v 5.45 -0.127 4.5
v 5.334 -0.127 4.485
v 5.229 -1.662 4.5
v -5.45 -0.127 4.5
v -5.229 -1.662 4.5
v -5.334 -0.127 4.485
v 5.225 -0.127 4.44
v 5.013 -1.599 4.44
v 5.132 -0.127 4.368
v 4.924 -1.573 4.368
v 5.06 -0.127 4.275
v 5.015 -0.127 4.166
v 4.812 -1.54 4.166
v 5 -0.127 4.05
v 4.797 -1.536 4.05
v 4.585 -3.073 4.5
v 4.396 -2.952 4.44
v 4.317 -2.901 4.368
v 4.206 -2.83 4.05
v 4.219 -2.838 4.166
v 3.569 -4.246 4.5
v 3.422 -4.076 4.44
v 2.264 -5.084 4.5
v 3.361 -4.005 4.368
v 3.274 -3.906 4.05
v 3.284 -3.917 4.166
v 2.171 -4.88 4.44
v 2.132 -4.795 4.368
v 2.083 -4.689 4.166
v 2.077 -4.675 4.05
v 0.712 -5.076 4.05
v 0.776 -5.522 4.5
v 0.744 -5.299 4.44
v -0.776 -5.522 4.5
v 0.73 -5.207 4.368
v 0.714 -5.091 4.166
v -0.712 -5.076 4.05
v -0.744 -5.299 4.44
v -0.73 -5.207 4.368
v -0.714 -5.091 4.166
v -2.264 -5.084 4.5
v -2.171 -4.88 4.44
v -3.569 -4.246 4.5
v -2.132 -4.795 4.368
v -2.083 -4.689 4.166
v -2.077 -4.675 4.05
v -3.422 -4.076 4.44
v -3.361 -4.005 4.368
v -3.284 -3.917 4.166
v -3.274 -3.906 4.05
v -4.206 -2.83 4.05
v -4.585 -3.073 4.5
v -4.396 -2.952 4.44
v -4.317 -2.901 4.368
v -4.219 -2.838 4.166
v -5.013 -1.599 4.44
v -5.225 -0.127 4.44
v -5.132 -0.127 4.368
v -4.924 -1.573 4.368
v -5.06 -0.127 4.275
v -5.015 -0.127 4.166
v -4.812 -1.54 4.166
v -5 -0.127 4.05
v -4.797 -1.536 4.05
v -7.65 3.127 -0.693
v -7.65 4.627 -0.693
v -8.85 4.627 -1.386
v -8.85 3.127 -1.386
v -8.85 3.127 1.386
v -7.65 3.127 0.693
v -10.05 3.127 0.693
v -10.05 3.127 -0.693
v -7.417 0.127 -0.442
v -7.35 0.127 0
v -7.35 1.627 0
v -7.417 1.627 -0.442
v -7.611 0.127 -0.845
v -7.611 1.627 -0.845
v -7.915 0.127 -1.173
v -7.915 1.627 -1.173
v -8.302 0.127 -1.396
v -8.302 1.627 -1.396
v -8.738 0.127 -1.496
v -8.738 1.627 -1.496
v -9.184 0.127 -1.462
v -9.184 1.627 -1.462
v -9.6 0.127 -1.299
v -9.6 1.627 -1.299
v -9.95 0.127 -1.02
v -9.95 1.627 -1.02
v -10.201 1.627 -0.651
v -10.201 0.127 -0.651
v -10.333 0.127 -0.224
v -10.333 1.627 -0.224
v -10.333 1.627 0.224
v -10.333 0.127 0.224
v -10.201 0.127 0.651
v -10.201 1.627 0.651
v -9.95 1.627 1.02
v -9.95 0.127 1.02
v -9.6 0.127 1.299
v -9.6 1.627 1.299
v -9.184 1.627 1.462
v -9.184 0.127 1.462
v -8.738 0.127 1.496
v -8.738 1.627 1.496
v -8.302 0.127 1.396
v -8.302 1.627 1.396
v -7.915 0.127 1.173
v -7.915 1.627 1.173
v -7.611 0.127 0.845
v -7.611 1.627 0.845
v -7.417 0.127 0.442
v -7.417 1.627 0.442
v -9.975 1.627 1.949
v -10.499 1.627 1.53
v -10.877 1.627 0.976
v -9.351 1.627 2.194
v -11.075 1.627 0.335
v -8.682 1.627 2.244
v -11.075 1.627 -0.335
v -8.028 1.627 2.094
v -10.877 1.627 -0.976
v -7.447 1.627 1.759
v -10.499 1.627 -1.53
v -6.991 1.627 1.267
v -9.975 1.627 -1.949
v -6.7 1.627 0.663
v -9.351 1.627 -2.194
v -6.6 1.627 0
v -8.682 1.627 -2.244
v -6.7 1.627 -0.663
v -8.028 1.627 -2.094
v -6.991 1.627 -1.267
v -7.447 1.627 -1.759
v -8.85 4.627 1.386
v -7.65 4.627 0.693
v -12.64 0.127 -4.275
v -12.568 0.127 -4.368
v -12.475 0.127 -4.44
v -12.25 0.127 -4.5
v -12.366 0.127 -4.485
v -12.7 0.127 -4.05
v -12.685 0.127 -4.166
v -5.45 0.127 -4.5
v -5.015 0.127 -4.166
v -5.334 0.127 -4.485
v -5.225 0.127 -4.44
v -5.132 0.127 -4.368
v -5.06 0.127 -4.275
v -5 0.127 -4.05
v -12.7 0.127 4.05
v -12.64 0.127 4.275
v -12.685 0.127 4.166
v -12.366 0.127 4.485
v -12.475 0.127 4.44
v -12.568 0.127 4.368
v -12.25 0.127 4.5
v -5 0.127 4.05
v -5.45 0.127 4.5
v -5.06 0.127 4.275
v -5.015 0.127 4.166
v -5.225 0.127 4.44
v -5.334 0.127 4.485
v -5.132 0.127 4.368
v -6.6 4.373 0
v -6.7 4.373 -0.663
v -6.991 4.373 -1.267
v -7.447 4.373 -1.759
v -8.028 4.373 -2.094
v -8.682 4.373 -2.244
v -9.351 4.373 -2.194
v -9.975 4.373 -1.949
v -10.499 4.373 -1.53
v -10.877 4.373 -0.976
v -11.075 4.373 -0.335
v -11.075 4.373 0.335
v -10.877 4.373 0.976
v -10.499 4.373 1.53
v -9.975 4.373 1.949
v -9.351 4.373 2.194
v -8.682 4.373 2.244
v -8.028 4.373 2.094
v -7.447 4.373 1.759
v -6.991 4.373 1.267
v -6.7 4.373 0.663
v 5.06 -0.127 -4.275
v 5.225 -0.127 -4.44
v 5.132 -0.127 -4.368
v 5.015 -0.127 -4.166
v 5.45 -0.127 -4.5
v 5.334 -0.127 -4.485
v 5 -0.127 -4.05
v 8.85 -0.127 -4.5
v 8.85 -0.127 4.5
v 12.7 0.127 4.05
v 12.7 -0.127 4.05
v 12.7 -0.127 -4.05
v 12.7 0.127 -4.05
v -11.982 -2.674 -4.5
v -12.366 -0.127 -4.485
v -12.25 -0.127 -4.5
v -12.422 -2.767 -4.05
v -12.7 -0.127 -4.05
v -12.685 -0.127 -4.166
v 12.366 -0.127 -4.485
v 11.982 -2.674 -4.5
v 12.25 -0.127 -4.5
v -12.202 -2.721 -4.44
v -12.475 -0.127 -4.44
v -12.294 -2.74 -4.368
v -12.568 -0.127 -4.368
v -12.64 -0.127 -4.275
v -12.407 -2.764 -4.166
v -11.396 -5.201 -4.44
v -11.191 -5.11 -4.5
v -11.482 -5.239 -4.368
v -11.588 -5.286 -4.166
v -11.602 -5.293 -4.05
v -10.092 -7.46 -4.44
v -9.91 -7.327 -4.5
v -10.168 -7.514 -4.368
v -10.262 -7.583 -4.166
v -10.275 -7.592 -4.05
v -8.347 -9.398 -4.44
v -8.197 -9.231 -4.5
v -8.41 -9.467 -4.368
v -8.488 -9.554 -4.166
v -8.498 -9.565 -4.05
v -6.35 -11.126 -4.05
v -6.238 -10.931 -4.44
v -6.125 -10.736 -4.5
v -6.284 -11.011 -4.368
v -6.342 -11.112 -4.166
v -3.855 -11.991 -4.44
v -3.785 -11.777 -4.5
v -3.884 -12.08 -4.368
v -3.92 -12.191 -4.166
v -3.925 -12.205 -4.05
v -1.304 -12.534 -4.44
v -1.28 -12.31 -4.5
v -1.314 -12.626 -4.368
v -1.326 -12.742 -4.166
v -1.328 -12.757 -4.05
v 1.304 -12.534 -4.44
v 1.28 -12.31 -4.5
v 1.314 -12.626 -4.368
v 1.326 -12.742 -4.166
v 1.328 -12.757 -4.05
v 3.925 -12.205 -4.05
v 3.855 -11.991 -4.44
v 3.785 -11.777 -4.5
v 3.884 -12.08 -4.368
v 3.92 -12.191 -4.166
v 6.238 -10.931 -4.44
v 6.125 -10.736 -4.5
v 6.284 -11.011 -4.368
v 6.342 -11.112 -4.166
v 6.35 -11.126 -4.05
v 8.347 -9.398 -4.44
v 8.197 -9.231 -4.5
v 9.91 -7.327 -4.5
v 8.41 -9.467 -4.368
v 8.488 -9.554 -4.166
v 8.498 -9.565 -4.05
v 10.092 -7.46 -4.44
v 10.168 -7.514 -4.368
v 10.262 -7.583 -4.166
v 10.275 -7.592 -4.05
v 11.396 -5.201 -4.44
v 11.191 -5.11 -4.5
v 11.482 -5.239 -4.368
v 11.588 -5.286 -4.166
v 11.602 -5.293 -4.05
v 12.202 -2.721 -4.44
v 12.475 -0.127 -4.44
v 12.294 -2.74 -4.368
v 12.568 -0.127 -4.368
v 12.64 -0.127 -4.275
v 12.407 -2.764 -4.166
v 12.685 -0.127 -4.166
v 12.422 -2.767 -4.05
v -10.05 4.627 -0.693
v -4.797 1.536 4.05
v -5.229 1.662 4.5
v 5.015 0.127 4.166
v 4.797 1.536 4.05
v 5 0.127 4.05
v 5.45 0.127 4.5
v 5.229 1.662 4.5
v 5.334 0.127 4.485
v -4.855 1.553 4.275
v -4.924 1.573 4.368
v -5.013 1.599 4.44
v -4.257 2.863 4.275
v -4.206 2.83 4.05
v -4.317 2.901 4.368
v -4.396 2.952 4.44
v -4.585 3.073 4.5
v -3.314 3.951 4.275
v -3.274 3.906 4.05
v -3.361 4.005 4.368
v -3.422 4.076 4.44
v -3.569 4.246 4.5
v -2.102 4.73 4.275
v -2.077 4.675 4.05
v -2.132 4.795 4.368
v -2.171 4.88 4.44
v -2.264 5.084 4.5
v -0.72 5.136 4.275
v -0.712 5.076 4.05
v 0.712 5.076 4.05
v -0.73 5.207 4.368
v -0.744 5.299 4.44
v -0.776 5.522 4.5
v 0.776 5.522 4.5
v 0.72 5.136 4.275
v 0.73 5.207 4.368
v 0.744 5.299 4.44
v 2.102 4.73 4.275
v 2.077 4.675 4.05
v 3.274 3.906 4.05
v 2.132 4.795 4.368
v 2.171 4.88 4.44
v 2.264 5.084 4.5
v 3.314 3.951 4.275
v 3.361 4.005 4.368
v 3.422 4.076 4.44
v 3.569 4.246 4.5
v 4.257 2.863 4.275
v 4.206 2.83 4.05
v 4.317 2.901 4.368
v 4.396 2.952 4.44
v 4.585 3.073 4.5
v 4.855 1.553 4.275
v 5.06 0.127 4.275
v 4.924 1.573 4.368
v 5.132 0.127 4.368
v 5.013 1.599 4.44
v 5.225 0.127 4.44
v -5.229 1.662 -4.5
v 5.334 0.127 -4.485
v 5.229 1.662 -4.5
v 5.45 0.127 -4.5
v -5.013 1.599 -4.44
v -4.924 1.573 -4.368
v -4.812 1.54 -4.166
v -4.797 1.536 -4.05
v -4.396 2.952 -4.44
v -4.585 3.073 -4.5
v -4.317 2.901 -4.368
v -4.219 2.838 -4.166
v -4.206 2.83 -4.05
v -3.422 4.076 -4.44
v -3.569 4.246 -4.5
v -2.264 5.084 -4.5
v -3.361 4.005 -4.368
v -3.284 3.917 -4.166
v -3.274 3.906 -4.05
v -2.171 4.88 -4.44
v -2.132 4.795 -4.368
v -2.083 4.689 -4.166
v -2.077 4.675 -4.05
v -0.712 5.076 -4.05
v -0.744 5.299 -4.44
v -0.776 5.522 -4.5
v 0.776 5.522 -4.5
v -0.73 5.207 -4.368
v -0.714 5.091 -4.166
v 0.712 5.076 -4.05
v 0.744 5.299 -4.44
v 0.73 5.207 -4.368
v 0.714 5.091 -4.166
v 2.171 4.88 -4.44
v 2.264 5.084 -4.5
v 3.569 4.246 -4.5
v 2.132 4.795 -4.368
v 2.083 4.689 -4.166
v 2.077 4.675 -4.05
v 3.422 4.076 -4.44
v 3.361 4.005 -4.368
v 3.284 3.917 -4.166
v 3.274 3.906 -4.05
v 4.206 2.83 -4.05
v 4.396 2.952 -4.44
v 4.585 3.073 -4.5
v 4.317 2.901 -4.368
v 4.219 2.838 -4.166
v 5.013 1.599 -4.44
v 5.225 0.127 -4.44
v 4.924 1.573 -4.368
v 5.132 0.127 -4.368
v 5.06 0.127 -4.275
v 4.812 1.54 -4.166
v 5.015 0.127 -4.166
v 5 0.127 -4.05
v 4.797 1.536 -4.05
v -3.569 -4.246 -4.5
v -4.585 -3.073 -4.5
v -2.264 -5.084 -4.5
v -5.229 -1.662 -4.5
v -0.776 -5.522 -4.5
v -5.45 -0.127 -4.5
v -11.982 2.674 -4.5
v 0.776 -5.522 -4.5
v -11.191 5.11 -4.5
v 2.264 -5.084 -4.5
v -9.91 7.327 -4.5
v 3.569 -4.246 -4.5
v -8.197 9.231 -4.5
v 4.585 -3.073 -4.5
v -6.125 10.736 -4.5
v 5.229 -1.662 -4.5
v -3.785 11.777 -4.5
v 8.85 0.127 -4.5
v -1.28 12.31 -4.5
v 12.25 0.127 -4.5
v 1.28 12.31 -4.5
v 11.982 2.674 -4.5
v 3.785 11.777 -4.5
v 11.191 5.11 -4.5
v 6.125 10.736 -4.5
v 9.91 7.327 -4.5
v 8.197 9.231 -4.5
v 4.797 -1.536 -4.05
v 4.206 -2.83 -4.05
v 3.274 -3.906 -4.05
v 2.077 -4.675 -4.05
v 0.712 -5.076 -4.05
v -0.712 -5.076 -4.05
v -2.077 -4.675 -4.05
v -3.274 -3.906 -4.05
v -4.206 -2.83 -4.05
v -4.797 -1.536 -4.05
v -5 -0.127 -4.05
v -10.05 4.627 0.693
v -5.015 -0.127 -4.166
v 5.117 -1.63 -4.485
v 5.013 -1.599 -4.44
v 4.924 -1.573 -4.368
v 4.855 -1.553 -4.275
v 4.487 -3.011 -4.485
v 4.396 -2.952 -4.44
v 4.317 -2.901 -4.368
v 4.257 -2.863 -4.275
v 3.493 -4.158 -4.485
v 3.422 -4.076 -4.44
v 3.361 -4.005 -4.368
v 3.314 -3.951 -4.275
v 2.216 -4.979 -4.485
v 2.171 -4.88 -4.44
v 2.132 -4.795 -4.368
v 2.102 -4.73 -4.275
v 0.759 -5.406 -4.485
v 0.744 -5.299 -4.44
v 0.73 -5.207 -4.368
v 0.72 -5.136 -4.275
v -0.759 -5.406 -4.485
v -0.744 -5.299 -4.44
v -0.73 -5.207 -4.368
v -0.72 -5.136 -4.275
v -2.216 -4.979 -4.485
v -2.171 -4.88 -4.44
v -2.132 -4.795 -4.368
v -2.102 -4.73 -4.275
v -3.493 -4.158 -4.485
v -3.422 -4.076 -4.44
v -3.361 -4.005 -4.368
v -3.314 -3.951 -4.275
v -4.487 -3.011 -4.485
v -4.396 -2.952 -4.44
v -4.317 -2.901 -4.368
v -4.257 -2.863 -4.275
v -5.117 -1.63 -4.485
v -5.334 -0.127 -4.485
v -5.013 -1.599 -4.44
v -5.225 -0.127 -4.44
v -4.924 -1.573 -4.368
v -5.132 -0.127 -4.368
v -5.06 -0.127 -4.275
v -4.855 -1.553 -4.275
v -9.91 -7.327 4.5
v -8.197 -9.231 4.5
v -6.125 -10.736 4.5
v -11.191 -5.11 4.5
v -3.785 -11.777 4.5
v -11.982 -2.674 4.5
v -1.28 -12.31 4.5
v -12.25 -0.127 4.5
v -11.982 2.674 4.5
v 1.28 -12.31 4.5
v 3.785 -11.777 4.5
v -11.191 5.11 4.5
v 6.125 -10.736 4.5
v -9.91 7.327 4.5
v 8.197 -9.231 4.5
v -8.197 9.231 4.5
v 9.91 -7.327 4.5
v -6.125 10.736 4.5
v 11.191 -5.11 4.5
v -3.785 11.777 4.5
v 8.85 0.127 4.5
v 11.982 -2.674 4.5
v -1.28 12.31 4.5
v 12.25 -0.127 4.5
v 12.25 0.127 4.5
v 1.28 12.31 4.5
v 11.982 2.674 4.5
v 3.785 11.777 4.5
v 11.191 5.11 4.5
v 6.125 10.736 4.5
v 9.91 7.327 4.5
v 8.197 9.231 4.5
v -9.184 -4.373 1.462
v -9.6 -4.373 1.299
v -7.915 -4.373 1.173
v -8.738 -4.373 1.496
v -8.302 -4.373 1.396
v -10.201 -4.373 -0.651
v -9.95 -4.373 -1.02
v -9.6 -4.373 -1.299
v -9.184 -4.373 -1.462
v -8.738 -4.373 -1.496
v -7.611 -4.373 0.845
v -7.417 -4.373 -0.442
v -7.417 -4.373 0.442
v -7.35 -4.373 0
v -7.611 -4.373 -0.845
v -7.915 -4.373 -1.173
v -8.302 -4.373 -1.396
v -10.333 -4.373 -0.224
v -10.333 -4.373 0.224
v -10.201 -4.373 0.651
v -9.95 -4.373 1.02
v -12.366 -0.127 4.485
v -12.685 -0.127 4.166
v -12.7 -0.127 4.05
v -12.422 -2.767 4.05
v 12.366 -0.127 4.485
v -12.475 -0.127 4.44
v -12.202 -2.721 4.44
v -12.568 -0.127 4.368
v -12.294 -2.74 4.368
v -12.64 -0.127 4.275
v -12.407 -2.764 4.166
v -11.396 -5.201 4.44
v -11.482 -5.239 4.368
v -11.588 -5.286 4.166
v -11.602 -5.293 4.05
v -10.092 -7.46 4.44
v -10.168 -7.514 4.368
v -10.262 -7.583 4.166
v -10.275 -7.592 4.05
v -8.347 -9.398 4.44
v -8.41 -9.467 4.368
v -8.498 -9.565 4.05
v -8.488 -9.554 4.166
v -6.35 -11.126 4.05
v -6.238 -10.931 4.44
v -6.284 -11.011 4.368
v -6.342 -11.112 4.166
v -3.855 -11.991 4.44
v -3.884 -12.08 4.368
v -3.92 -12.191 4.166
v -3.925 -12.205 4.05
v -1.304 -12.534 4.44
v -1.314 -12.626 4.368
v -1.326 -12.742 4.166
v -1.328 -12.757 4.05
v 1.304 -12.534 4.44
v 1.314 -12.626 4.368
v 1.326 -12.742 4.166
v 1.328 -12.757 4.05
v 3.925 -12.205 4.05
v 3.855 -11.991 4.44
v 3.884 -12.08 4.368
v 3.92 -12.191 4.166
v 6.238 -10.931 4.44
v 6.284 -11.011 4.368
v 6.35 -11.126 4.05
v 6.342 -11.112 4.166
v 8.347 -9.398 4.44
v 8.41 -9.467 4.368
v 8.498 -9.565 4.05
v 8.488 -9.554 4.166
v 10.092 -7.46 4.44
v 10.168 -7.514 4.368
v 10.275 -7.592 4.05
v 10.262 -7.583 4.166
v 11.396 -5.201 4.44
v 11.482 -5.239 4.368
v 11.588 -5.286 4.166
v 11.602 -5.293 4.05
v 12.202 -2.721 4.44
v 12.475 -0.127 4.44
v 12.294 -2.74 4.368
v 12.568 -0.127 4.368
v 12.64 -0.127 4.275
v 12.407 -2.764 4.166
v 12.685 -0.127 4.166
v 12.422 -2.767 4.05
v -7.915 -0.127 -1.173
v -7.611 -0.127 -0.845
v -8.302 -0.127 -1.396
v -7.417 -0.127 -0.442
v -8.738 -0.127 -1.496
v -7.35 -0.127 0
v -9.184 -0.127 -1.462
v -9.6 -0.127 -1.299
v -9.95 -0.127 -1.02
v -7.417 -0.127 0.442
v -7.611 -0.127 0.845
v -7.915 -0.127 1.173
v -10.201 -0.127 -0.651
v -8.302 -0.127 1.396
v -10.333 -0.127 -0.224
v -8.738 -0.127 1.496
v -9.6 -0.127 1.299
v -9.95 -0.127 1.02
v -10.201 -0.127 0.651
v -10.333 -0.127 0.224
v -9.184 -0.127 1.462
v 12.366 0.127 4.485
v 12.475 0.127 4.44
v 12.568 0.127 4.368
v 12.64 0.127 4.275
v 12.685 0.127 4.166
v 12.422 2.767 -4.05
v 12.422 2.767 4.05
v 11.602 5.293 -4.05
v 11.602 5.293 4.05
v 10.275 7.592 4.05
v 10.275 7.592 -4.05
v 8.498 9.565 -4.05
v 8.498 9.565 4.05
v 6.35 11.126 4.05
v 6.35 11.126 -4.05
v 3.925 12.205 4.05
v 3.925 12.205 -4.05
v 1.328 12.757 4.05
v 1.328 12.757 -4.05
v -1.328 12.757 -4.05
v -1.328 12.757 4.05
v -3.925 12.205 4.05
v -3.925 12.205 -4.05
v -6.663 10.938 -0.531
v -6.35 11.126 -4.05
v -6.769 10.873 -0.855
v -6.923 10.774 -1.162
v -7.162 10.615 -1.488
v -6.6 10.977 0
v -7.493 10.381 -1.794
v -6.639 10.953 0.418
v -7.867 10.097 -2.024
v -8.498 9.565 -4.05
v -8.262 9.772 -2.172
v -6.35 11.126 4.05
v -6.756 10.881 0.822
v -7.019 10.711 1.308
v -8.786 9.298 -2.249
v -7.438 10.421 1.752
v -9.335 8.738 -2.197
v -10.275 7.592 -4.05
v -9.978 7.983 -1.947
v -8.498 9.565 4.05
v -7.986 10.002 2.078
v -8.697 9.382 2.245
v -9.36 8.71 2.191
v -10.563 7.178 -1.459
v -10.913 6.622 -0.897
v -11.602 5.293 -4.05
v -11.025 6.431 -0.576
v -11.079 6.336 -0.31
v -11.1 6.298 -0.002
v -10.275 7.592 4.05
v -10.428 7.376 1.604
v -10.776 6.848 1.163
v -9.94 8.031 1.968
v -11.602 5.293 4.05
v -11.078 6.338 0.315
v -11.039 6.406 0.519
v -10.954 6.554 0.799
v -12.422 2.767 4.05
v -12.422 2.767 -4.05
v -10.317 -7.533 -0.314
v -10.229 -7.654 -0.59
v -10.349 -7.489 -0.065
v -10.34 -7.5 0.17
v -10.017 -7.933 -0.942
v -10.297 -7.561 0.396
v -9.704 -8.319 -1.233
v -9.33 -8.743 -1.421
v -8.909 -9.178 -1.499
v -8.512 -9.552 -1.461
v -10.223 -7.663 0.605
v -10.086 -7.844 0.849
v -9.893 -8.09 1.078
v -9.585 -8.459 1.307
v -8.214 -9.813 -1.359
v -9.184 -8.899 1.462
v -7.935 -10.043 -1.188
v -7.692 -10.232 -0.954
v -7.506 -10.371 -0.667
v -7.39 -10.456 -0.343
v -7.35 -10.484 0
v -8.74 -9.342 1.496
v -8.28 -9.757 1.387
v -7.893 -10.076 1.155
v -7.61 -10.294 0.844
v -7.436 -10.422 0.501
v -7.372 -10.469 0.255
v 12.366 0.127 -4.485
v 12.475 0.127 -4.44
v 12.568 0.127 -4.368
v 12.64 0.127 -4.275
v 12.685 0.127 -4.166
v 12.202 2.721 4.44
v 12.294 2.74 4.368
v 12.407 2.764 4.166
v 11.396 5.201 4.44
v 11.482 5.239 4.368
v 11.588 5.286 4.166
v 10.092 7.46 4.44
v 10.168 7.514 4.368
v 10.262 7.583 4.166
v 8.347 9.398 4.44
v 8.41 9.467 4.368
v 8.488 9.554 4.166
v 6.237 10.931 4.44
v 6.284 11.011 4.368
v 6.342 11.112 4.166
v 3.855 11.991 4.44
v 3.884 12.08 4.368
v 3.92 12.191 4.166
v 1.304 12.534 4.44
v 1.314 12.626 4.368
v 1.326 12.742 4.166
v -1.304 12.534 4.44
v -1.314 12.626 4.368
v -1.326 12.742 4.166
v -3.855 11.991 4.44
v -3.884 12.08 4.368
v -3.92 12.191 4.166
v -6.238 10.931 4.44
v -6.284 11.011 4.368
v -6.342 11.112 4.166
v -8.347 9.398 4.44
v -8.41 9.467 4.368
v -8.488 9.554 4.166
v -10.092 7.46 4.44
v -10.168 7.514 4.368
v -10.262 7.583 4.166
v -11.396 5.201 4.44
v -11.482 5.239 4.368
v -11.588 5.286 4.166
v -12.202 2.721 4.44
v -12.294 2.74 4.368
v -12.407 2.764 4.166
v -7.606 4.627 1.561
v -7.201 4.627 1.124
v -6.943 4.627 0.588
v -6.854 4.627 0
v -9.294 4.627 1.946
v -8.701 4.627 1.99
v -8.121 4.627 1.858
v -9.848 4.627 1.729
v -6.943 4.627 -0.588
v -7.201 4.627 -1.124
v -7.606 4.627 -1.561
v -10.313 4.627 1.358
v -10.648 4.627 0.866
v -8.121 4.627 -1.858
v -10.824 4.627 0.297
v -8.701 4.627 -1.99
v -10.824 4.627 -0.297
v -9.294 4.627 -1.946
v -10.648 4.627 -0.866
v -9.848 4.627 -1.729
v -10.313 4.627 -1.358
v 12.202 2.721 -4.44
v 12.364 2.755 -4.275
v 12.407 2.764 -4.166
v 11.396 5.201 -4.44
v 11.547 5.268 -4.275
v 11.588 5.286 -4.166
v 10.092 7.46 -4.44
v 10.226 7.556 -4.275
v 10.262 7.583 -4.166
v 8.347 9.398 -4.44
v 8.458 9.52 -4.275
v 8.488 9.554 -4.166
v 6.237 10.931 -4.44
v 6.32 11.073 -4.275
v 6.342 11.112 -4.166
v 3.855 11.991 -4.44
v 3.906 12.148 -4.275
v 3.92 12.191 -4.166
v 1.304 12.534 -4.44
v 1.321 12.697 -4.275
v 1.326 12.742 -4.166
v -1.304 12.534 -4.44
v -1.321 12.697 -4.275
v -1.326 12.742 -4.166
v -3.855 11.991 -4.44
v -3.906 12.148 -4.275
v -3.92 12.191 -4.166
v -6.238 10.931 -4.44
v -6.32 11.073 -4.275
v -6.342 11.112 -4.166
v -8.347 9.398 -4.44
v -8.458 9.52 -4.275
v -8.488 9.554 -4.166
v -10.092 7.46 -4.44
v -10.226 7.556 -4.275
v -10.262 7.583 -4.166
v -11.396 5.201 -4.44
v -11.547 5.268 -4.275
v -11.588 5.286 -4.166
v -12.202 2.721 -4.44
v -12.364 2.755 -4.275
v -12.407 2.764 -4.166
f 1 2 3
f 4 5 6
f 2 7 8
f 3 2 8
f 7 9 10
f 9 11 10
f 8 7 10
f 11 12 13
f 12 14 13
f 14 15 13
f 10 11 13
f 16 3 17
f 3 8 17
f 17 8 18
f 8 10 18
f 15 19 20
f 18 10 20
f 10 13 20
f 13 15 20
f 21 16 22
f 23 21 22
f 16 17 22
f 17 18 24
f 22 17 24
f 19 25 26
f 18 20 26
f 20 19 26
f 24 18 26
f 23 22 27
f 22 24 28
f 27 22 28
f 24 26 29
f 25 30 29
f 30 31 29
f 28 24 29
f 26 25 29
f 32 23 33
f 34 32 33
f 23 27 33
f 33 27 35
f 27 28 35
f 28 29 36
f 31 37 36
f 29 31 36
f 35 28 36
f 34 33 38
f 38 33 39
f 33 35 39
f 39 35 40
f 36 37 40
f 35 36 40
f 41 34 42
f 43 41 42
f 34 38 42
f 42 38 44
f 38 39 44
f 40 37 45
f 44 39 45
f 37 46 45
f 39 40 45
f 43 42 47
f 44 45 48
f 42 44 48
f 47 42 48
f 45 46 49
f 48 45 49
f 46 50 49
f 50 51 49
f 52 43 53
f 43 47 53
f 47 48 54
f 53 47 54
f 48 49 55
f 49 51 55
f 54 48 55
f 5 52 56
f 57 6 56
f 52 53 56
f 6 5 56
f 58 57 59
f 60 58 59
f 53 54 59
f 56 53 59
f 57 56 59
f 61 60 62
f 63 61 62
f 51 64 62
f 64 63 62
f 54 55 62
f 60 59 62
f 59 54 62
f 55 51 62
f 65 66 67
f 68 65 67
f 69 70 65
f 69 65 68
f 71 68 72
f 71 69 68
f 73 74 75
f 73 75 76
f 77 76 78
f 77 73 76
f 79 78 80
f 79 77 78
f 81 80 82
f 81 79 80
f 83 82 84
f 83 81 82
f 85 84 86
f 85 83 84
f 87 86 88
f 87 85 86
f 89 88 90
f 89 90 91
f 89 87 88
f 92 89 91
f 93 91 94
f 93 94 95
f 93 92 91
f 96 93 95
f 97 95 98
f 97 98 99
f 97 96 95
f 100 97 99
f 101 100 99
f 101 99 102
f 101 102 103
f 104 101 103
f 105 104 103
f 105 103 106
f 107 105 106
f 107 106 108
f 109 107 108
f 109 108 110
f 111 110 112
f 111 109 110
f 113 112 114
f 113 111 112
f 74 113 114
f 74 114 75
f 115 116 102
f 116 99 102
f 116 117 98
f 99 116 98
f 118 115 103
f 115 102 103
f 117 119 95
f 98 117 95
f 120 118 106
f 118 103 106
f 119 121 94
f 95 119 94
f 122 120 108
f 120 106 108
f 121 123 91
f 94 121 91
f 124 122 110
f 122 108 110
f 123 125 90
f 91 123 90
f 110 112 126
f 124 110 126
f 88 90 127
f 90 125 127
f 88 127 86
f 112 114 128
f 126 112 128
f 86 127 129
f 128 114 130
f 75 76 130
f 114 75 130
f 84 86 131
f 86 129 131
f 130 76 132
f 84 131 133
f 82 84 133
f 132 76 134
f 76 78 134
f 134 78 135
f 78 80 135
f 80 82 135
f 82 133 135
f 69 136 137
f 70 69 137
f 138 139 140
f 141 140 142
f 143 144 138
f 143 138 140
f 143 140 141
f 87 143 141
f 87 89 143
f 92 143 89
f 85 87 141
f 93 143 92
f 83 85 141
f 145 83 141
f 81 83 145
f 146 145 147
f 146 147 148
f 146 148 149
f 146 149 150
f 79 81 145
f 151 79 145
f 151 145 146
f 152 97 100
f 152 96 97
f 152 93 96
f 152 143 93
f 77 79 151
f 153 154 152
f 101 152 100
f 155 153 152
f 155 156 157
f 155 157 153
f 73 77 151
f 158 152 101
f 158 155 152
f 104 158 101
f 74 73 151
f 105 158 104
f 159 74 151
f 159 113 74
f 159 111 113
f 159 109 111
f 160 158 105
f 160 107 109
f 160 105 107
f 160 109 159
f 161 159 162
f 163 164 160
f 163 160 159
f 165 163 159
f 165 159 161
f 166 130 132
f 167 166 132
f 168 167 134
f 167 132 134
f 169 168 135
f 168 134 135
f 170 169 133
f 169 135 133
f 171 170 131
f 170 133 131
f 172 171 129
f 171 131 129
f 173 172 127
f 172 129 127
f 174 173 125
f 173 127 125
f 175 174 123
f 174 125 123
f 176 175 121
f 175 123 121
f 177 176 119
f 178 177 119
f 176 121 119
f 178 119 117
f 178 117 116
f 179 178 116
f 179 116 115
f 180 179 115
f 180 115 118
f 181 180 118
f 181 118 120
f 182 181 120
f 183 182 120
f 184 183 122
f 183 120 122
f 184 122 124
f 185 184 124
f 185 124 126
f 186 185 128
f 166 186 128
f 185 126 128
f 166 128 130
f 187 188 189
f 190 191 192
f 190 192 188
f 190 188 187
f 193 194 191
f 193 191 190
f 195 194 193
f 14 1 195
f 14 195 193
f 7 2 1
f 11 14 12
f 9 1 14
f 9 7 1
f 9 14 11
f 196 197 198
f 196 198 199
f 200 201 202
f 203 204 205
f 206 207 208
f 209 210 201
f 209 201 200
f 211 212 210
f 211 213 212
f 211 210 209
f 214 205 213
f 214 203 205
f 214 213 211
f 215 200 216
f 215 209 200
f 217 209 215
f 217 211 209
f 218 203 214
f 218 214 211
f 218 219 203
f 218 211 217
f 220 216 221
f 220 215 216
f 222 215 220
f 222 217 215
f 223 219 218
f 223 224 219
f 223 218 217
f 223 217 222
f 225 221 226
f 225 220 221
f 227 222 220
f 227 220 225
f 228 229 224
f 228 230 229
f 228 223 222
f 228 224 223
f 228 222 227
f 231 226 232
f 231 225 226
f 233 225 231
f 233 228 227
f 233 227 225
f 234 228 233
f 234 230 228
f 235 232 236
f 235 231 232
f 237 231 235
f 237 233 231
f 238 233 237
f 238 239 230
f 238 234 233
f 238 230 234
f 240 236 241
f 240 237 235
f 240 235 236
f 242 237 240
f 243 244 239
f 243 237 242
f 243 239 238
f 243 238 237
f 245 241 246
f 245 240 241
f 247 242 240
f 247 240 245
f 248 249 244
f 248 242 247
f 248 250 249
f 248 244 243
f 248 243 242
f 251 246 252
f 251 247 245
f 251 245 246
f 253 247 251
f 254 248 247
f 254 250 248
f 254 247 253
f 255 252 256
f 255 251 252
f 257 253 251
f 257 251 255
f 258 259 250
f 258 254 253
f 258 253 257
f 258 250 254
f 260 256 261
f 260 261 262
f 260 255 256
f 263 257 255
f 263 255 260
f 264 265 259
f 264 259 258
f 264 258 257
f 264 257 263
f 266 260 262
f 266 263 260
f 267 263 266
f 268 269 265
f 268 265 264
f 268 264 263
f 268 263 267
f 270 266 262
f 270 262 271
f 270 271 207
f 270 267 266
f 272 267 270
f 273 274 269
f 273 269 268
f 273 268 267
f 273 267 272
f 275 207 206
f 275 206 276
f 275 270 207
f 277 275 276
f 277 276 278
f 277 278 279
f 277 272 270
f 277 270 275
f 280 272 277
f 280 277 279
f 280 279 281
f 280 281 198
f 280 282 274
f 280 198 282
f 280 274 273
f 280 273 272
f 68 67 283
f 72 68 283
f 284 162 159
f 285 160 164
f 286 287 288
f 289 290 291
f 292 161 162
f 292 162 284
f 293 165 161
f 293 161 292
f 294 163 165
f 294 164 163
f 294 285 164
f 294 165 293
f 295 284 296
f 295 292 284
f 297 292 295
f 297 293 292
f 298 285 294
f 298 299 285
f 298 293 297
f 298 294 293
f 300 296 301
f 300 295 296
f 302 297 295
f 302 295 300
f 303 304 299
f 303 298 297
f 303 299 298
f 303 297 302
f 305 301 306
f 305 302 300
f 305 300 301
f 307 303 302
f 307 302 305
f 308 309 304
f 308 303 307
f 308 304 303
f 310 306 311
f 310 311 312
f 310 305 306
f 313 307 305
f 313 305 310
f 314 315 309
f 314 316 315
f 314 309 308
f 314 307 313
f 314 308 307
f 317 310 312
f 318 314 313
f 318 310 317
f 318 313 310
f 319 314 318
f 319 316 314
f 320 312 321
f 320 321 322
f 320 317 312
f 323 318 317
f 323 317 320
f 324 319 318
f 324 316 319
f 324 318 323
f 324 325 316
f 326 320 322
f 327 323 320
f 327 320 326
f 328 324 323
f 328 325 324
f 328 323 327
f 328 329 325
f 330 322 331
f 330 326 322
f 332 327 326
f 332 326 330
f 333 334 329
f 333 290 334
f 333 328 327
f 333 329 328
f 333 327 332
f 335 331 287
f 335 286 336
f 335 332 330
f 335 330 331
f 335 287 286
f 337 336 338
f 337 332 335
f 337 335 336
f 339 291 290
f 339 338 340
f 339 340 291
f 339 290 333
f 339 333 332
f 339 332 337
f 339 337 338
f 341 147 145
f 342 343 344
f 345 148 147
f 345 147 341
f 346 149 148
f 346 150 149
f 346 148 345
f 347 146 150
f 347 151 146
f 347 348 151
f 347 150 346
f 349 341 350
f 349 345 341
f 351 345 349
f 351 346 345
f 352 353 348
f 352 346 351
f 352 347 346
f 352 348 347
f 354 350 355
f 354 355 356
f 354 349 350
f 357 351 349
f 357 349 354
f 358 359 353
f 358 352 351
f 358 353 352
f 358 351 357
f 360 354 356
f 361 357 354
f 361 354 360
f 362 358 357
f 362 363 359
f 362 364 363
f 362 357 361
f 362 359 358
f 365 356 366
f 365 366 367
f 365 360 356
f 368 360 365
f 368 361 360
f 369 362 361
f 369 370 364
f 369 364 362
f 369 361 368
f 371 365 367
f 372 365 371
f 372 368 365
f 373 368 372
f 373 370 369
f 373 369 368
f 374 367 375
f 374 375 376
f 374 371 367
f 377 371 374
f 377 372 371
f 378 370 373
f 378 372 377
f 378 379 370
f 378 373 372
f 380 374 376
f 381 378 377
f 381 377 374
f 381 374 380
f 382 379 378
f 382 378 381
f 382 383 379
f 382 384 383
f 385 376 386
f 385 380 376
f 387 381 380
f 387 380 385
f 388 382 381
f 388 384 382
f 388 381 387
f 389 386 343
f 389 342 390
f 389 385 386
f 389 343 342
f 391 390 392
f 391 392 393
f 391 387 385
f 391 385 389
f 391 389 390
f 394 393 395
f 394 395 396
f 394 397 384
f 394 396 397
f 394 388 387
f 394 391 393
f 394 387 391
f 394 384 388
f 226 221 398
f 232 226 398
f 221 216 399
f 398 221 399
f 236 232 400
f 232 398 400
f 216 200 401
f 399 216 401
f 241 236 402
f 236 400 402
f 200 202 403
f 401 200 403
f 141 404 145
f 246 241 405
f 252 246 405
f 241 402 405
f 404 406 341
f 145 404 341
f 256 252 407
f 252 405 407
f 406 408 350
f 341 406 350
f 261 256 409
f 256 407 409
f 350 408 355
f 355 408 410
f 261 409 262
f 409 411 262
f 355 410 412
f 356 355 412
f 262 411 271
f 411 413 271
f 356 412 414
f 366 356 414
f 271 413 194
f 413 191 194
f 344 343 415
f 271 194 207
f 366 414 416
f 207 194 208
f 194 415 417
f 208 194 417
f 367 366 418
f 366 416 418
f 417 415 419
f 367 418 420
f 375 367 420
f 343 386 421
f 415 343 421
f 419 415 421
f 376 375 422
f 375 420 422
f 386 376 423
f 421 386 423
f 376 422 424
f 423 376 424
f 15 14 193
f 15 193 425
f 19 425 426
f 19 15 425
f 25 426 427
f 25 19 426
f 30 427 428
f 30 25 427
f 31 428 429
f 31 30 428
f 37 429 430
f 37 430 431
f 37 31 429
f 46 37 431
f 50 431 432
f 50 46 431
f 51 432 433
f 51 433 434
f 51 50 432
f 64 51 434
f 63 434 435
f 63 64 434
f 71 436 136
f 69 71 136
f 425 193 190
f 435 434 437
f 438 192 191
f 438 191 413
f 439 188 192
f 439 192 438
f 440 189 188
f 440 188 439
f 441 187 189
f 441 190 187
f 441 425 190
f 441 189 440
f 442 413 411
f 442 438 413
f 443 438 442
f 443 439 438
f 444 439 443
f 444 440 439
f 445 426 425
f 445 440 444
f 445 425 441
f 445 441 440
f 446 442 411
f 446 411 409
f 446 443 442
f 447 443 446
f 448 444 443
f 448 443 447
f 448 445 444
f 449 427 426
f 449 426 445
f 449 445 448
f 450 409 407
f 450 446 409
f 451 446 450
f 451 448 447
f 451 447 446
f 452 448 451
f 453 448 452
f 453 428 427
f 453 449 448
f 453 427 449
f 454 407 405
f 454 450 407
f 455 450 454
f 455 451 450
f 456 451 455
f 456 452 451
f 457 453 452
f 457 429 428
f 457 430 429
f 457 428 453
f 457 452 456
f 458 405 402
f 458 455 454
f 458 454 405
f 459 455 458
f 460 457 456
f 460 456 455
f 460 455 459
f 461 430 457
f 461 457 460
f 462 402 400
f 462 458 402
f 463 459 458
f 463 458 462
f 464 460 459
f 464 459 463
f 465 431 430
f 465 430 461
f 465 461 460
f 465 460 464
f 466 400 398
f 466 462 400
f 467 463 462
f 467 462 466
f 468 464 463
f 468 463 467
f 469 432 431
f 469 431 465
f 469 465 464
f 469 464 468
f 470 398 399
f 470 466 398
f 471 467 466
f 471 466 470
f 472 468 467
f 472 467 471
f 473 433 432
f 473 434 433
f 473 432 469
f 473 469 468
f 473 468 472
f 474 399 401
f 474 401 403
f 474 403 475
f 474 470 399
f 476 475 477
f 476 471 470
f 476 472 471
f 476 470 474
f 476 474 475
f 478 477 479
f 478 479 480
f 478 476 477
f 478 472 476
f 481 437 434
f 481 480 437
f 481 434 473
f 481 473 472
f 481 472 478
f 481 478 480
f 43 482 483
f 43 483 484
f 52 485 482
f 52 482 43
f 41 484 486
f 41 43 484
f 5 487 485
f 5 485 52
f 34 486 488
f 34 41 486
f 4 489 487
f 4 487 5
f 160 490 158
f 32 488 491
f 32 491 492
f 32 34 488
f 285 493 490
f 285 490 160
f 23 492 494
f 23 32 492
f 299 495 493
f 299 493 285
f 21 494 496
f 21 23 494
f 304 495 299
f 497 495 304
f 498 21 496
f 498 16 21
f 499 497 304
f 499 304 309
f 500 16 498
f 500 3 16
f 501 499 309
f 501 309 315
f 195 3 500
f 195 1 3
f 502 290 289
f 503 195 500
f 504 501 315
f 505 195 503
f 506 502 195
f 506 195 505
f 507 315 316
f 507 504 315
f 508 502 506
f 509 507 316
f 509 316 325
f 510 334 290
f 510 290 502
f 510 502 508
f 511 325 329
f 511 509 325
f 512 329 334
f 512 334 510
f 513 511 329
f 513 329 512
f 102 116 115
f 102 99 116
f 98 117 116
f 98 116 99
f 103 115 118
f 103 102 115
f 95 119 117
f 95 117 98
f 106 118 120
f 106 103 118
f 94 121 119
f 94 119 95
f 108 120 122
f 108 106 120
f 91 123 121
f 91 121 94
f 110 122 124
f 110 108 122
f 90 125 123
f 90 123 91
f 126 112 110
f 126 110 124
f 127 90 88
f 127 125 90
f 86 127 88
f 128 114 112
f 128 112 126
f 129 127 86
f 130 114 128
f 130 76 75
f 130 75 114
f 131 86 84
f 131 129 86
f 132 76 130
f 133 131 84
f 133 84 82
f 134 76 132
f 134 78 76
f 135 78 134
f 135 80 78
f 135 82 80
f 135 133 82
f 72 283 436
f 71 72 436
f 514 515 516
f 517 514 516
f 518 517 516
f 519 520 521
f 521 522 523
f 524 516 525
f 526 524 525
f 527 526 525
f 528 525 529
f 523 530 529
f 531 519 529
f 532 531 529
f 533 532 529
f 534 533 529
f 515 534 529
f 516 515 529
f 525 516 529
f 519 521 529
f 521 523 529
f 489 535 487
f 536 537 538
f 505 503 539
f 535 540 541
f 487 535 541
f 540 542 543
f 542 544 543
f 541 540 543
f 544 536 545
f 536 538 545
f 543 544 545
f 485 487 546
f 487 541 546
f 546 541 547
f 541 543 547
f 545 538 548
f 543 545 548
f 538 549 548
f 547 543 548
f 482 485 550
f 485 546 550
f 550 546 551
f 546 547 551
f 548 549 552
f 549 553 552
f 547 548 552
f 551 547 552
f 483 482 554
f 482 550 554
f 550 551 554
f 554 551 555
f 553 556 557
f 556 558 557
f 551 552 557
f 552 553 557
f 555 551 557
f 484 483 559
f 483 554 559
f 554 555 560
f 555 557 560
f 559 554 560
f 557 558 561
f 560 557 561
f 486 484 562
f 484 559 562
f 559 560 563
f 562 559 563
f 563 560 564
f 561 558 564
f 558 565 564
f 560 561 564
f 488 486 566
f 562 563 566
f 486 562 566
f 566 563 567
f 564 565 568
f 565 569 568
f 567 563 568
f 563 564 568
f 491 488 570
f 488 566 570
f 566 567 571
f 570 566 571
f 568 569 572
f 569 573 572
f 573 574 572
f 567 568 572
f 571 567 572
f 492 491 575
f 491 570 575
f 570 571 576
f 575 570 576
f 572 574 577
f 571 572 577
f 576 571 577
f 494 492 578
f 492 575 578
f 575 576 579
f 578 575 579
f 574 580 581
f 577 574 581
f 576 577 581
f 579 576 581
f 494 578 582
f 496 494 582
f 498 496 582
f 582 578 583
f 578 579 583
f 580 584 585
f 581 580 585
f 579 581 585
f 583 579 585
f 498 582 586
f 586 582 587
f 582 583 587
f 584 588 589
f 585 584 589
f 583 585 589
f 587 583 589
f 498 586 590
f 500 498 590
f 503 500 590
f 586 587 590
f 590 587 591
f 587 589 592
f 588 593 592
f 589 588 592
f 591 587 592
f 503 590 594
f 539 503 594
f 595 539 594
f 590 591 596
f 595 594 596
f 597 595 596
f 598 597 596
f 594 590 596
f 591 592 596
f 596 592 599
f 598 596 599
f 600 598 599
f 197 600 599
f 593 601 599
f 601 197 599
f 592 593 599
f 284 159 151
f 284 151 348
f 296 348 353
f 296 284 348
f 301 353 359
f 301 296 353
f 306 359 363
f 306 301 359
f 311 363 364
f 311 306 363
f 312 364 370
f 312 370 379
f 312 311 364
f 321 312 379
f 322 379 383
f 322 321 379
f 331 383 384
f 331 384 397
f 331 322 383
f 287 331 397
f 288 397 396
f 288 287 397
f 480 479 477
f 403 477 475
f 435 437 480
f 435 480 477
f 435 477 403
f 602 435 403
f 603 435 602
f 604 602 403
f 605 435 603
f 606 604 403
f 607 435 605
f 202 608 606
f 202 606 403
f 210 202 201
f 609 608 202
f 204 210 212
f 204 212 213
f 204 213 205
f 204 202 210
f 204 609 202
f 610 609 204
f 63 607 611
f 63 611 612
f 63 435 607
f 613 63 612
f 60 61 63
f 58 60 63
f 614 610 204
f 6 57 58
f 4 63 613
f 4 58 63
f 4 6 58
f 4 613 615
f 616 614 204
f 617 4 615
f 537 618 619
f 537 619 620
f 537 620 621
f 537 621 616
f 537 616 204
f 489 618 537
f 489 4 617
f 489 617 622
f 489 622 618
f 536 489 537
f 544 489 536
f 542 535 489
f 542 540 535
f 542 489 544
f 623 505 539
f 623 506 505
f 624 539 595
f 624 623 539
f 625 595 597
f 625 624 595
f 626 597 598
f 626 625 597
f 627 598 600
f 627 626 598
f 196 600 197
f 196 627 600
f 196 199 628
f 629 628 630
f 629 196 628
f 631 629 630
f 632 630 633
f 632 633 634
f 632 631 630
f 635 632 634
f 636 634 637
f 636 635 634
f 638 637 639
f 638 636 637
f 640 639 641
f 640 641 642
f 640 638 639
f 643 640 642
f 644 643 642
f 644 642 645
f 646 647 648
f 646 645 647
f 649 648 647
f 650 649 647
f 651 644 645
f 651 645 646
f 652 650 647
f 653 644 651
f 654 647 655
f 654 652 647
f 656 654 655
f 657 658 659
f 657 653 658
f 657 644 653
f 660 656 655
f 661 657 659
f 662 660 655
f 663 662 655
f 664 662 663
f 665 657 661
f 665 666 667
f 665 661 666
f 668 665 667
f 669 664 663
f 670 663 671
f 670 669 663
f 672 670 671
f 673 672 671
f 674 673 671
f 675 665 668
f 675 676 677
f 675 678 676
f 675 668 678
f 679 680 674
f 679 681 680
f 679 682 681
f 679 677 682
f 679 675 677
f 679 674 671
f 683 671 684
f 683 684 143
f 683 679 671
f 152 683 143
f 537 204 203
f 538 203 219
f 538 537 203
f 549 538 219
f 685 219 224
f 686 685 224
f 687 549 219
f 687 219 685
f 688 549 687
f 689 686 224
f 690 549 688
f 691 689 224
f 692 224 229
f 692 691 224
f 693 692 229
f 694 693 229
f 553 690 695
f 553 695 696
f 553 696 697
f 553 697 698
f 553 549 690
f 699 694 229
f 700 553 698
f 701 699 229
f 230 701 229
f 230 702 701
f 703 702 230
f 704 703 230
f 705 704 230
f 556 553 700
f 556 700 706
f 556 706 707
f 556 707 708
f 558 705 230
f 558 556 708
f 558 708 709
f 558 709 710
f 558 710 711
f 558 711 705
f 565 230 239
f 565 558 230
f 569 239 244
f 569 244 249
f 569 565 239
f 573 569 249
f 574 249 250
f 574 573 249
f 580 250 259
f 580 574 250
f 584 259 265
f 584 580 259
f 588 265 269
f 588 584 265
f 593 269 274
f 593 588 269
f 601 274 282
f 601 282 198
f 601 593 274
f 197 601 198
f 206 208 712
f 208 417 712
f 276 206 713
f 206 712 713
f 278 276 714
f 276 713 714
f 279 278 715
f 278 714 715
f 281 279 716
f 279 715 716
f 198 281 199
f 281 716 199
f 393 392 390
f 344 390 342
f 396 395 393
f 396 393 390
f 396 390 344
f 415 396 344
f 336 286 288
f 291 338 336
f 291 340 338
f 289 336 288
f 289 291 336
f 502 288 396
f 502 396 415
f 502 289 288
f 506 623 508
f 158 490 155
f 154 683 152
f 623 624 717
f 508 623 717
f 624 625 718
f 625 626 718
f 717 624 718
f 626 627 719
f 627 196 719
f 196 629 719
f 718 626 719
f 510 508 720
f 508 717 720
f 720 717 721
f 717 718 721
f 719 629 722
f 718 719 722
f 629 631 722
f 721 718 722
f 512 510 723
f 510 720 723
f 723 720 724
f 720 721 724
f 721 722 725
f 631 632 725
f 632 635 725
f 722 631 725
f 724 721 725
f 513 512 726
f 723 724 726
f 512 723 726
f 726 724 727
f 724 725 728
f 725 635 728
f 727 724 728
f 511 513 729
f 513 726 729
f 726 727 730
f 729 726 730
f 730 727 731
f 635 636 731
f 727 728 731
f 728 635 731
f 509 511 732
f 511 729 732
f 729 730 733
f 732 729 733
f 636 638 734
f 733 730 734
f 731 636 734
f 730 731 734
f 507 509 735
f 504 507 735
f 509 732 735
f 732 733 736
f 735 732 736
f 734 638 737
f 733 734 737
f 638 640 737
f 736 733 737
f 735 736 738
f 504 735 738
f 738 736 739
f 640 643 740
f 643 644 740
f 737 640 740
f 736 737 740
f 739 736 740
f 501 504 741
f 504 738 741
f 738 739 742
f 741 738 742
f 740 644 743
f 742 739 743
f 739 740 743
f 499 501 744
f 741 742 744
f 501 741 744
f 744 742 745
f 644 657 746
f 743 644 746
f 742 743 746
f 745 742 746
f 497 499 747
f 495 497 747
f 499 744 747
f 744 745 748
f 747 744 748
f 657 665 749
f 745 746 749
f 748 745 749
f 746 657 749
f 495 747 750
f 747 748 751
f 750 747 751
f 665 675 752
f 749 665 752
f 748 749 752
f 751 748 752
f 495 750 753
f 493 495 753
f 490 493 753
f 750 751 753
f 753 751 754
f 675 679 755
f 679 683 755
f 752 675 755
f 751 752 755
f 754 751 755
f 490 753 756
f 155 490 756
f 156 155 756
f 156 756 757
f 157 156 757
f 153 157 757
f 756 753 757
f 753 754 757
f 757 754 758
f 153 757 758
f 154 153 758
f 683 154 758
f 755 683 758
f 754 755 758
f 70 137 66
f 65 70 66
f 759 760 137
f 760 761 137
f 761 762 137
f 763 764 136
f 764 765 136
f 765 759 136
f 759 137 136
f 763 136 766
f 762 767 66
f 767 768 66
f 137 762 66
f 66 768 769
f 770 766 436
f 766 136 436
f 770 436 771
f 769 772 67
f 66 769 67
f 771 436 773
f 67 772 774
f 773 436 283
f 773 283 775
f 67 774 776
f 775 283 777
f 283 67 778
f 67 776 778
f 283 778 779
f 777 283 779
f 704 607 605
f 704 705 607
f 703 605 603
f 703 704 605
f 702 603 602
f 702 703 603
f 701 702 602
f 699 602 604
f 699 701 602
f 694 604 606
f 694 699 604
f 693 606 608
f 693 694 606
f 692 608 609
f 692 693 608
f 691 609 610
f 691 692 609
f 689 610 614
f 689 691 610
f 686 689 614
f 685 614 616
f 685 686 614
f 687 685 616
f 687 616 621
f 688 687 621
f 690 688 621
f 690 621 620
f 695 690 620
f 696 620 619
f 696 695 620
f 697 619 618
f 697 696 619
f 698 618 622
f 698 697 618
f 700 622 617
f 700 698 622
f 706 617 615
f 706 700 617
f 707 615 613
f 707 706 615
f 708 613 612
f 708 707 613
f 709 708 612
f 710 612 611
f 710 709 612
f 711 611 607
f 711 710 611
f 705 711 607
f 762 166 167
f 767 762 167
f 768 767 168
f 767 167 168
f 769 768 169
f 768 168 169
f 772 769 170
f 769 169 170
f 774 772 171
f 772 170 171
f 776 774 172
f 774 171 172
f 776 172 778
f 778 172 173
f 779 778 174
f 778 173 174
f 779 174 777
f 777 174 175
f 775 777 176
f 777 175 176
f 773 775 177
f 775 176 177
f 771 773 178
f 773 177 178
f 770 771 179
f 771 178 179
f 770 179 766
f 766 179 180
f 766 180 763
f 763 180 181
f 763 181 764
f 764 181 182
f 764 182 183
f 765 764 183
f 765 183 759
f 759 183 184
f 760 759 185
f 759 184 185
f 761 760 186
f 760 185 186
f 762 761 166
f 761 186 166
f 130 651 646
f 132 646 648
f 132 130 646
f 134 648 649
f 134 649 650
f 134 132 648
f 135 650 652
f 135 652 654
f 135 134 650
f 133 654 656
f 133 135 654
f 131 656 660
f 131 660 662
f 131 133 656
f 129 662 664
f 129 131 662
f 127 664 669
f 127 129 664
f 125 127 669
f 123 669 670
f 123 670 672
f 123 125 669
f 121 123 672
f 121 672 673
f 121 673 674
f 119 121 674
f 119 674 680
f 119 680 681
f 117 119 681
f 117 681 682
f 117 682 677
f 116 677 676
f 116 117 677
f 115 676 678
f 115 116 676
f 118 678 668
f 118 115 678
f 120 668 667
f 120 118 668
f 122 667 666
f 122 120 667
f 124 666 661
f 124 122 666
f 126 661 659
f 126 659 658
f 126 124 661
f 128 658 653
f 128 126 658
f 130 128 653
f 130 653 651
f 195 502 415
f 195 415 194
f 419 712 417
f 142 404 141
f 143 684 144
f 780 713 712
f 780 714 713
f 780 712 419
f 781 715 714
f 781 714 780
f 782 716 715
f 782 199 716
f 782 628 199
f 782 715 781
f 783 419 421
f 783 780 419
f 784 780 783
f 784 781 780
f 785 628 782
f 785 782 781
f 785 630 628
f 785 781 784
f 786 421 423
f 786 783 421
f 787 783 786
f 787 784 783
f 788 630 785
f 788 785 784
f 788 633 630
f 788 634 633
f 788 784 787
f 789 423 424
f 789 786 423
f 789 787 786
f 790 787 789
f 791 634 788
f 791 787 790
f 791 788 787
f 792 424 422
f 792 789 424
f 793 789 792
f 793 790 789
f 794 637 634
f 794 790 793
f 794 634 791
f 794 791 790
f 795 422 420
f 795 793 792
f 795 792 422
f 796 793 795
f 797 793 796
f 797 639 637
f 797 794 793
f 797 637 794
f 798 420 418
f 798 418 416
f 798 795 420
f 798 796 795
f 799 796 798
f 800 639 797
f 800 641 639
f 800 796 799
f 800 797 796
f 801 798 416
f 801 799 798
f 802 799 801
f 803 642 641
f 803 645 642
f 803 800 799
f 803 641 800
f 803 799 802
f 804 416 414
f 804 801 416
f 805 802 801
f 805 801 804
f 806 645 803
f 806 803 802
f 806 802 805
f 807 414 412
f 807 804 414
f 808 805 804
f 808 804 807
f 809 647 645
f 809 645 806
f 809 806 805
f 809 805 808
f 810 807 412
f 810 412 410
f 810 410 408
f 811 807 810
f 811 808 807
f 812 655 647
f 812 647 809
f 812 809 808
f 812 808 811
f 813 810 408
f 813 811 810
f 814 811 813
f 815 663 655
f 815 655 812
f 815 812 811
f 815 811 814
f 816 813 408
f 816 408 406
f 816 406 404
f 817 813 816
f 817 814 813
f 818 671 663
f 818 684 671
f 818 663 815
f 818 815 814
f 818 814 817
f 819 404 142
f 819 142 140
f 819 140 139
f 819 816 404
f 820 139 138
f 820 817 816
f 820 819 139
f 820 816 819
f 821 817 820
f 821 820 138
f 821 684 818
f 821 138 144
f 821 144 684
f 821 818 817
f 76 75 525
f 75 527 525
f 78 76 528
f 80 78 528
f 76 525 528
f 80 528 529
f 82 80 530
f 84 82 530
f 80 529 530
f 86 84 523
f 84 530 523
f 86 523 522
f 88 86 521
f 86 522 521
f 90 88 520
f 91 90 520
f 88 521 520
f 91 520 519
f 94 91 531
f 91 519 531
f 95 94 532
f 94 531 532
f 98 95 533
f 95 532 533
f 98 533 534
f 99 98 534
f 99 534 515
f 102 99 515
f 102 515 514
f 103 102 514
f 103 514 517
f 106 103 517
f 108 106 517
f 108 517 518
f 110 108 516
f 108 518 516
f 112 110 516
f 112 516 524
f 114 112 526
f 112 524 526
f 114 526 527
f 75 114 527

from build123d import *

# Parameters (mm, degrees)
EXTRUDE1_DEPTH     = 4.5
CUT_EXTRUDE2_DEPTH = 1.5
FILLET1_R          = 0.45
FILLET2_R          = 0.45
CHAMFER2_SIZE      = 0.254


with BuildPart() as part:
    # Sketch1 → Extrude1 (new body, symmetric)
    with BuildSketch(Plane.XY):
        with BuildLine():
            Line((-12.7, 0.127), (-5, 0.127))
            ThreePointArc((-5, 0.127), (0, 5.127), (5, 0.127))
            Line((5, 0.127), (8.85, 0.127))
            Line((8.85, 0.127), (8.85, -0.127))
            Line((8.85, -0.127), (5, -0.127))
            ThreePointArc((5, -0.127), (0, -5.127), (-5, -0.127))
            Line((-5, -0.127), (-12.7, -0.127))
            ThreePointArc((-12.7, -0.127), (0, -12.827), (12.7, -0.127))
            Line((12.7, -0.127), (12.7, 0.127))
            ThreePointArc((12.7, 0.127), (0, 12.827), (-12.7, 0.127))
        make_face()
    extrude(amount=EXTRUDE1_DEPTH, both=True)

    # Sketch4 → Cut-Revolve1 (revolve, cut)
    with BuildSketch(Plane.XY):
        Polygon((-8.85, 12.827), (-6.6, 12.827), (-6.6, 1.627), (-7.35, 1.627), (-7.35, -12.827), (-8.85, -12.827), align=None)
    revolve(axis=Axis((-8.85, -12.827, 0), (0, 1, 0)), mode=Mode.SUBTRACT)

    # Fillet1
    fillet1_edges = [part.edges().sort_by_distance(p)[0] for p in [
        (0, 5.127, 4.5),
        (0, 5.127, -4.5),
        (0, 12.827, -4.5),
        (0, -12.827, 4.5),
        (12.7, 0, 4.5),
        (0, 12.827, 4.5),
        (12.7, 0, -4.5),
        (0, -12.827, -4.5),
    ]]
    fillet(fillet1_edges, radius=FILLET1_R)

    # Fillet2
    fillet2_edges = [part.edges().sort_by_distance(p)[0] for p in [
        (0, -5.127, 4.5),
        (0, -5.127, -4.5),
    ]]
    fillet(fillet2_edges, radius=FILLET2_R)


with BuildPart() as body_2:
    # Sketch6 → Revolve1 (revolve)
    with BuildSketch(Plane.XY):
        Polygon((-8.85, 4.627), (-6.6, 4.627), (-6.6, 1.627), (-7.35, 1.627), (-7.35, -4.373), (-8.85, -4.373), align=None)
    revolve(axis=Axis((-8.85, -4.373, 0), (0, 1, 0)))

    # Sketch7 → Cut-Extrude2 (cut)
    with BuildSketch(Plane(origin=(0, 4.627, 0), x_dir=(-1, 0, 0), z_dir=(0, 1, 0))):
        Polygon((8.85, -1.385640646), (10.05, -0.692820323), (10.05, 0.692820323), (8.85, 1.385640646), (7.65, 0.692820323), (7.65, -0.692820323), align=None)
    extrude(amount=-CUT_EXTRUDE2_DEPTH, mode=Mode.SUBTRACT)

    # Chamfer2
    chamfer2_edges = [body_2.edges().sort_by_distance(p)[0] for p in [
        (-11.1, 4.627, 0),
    ]]
    chamfer(chamfer2_edges, length=CHAMFER2_SIZE)


solid = Compound([part.part, body_2.part])
